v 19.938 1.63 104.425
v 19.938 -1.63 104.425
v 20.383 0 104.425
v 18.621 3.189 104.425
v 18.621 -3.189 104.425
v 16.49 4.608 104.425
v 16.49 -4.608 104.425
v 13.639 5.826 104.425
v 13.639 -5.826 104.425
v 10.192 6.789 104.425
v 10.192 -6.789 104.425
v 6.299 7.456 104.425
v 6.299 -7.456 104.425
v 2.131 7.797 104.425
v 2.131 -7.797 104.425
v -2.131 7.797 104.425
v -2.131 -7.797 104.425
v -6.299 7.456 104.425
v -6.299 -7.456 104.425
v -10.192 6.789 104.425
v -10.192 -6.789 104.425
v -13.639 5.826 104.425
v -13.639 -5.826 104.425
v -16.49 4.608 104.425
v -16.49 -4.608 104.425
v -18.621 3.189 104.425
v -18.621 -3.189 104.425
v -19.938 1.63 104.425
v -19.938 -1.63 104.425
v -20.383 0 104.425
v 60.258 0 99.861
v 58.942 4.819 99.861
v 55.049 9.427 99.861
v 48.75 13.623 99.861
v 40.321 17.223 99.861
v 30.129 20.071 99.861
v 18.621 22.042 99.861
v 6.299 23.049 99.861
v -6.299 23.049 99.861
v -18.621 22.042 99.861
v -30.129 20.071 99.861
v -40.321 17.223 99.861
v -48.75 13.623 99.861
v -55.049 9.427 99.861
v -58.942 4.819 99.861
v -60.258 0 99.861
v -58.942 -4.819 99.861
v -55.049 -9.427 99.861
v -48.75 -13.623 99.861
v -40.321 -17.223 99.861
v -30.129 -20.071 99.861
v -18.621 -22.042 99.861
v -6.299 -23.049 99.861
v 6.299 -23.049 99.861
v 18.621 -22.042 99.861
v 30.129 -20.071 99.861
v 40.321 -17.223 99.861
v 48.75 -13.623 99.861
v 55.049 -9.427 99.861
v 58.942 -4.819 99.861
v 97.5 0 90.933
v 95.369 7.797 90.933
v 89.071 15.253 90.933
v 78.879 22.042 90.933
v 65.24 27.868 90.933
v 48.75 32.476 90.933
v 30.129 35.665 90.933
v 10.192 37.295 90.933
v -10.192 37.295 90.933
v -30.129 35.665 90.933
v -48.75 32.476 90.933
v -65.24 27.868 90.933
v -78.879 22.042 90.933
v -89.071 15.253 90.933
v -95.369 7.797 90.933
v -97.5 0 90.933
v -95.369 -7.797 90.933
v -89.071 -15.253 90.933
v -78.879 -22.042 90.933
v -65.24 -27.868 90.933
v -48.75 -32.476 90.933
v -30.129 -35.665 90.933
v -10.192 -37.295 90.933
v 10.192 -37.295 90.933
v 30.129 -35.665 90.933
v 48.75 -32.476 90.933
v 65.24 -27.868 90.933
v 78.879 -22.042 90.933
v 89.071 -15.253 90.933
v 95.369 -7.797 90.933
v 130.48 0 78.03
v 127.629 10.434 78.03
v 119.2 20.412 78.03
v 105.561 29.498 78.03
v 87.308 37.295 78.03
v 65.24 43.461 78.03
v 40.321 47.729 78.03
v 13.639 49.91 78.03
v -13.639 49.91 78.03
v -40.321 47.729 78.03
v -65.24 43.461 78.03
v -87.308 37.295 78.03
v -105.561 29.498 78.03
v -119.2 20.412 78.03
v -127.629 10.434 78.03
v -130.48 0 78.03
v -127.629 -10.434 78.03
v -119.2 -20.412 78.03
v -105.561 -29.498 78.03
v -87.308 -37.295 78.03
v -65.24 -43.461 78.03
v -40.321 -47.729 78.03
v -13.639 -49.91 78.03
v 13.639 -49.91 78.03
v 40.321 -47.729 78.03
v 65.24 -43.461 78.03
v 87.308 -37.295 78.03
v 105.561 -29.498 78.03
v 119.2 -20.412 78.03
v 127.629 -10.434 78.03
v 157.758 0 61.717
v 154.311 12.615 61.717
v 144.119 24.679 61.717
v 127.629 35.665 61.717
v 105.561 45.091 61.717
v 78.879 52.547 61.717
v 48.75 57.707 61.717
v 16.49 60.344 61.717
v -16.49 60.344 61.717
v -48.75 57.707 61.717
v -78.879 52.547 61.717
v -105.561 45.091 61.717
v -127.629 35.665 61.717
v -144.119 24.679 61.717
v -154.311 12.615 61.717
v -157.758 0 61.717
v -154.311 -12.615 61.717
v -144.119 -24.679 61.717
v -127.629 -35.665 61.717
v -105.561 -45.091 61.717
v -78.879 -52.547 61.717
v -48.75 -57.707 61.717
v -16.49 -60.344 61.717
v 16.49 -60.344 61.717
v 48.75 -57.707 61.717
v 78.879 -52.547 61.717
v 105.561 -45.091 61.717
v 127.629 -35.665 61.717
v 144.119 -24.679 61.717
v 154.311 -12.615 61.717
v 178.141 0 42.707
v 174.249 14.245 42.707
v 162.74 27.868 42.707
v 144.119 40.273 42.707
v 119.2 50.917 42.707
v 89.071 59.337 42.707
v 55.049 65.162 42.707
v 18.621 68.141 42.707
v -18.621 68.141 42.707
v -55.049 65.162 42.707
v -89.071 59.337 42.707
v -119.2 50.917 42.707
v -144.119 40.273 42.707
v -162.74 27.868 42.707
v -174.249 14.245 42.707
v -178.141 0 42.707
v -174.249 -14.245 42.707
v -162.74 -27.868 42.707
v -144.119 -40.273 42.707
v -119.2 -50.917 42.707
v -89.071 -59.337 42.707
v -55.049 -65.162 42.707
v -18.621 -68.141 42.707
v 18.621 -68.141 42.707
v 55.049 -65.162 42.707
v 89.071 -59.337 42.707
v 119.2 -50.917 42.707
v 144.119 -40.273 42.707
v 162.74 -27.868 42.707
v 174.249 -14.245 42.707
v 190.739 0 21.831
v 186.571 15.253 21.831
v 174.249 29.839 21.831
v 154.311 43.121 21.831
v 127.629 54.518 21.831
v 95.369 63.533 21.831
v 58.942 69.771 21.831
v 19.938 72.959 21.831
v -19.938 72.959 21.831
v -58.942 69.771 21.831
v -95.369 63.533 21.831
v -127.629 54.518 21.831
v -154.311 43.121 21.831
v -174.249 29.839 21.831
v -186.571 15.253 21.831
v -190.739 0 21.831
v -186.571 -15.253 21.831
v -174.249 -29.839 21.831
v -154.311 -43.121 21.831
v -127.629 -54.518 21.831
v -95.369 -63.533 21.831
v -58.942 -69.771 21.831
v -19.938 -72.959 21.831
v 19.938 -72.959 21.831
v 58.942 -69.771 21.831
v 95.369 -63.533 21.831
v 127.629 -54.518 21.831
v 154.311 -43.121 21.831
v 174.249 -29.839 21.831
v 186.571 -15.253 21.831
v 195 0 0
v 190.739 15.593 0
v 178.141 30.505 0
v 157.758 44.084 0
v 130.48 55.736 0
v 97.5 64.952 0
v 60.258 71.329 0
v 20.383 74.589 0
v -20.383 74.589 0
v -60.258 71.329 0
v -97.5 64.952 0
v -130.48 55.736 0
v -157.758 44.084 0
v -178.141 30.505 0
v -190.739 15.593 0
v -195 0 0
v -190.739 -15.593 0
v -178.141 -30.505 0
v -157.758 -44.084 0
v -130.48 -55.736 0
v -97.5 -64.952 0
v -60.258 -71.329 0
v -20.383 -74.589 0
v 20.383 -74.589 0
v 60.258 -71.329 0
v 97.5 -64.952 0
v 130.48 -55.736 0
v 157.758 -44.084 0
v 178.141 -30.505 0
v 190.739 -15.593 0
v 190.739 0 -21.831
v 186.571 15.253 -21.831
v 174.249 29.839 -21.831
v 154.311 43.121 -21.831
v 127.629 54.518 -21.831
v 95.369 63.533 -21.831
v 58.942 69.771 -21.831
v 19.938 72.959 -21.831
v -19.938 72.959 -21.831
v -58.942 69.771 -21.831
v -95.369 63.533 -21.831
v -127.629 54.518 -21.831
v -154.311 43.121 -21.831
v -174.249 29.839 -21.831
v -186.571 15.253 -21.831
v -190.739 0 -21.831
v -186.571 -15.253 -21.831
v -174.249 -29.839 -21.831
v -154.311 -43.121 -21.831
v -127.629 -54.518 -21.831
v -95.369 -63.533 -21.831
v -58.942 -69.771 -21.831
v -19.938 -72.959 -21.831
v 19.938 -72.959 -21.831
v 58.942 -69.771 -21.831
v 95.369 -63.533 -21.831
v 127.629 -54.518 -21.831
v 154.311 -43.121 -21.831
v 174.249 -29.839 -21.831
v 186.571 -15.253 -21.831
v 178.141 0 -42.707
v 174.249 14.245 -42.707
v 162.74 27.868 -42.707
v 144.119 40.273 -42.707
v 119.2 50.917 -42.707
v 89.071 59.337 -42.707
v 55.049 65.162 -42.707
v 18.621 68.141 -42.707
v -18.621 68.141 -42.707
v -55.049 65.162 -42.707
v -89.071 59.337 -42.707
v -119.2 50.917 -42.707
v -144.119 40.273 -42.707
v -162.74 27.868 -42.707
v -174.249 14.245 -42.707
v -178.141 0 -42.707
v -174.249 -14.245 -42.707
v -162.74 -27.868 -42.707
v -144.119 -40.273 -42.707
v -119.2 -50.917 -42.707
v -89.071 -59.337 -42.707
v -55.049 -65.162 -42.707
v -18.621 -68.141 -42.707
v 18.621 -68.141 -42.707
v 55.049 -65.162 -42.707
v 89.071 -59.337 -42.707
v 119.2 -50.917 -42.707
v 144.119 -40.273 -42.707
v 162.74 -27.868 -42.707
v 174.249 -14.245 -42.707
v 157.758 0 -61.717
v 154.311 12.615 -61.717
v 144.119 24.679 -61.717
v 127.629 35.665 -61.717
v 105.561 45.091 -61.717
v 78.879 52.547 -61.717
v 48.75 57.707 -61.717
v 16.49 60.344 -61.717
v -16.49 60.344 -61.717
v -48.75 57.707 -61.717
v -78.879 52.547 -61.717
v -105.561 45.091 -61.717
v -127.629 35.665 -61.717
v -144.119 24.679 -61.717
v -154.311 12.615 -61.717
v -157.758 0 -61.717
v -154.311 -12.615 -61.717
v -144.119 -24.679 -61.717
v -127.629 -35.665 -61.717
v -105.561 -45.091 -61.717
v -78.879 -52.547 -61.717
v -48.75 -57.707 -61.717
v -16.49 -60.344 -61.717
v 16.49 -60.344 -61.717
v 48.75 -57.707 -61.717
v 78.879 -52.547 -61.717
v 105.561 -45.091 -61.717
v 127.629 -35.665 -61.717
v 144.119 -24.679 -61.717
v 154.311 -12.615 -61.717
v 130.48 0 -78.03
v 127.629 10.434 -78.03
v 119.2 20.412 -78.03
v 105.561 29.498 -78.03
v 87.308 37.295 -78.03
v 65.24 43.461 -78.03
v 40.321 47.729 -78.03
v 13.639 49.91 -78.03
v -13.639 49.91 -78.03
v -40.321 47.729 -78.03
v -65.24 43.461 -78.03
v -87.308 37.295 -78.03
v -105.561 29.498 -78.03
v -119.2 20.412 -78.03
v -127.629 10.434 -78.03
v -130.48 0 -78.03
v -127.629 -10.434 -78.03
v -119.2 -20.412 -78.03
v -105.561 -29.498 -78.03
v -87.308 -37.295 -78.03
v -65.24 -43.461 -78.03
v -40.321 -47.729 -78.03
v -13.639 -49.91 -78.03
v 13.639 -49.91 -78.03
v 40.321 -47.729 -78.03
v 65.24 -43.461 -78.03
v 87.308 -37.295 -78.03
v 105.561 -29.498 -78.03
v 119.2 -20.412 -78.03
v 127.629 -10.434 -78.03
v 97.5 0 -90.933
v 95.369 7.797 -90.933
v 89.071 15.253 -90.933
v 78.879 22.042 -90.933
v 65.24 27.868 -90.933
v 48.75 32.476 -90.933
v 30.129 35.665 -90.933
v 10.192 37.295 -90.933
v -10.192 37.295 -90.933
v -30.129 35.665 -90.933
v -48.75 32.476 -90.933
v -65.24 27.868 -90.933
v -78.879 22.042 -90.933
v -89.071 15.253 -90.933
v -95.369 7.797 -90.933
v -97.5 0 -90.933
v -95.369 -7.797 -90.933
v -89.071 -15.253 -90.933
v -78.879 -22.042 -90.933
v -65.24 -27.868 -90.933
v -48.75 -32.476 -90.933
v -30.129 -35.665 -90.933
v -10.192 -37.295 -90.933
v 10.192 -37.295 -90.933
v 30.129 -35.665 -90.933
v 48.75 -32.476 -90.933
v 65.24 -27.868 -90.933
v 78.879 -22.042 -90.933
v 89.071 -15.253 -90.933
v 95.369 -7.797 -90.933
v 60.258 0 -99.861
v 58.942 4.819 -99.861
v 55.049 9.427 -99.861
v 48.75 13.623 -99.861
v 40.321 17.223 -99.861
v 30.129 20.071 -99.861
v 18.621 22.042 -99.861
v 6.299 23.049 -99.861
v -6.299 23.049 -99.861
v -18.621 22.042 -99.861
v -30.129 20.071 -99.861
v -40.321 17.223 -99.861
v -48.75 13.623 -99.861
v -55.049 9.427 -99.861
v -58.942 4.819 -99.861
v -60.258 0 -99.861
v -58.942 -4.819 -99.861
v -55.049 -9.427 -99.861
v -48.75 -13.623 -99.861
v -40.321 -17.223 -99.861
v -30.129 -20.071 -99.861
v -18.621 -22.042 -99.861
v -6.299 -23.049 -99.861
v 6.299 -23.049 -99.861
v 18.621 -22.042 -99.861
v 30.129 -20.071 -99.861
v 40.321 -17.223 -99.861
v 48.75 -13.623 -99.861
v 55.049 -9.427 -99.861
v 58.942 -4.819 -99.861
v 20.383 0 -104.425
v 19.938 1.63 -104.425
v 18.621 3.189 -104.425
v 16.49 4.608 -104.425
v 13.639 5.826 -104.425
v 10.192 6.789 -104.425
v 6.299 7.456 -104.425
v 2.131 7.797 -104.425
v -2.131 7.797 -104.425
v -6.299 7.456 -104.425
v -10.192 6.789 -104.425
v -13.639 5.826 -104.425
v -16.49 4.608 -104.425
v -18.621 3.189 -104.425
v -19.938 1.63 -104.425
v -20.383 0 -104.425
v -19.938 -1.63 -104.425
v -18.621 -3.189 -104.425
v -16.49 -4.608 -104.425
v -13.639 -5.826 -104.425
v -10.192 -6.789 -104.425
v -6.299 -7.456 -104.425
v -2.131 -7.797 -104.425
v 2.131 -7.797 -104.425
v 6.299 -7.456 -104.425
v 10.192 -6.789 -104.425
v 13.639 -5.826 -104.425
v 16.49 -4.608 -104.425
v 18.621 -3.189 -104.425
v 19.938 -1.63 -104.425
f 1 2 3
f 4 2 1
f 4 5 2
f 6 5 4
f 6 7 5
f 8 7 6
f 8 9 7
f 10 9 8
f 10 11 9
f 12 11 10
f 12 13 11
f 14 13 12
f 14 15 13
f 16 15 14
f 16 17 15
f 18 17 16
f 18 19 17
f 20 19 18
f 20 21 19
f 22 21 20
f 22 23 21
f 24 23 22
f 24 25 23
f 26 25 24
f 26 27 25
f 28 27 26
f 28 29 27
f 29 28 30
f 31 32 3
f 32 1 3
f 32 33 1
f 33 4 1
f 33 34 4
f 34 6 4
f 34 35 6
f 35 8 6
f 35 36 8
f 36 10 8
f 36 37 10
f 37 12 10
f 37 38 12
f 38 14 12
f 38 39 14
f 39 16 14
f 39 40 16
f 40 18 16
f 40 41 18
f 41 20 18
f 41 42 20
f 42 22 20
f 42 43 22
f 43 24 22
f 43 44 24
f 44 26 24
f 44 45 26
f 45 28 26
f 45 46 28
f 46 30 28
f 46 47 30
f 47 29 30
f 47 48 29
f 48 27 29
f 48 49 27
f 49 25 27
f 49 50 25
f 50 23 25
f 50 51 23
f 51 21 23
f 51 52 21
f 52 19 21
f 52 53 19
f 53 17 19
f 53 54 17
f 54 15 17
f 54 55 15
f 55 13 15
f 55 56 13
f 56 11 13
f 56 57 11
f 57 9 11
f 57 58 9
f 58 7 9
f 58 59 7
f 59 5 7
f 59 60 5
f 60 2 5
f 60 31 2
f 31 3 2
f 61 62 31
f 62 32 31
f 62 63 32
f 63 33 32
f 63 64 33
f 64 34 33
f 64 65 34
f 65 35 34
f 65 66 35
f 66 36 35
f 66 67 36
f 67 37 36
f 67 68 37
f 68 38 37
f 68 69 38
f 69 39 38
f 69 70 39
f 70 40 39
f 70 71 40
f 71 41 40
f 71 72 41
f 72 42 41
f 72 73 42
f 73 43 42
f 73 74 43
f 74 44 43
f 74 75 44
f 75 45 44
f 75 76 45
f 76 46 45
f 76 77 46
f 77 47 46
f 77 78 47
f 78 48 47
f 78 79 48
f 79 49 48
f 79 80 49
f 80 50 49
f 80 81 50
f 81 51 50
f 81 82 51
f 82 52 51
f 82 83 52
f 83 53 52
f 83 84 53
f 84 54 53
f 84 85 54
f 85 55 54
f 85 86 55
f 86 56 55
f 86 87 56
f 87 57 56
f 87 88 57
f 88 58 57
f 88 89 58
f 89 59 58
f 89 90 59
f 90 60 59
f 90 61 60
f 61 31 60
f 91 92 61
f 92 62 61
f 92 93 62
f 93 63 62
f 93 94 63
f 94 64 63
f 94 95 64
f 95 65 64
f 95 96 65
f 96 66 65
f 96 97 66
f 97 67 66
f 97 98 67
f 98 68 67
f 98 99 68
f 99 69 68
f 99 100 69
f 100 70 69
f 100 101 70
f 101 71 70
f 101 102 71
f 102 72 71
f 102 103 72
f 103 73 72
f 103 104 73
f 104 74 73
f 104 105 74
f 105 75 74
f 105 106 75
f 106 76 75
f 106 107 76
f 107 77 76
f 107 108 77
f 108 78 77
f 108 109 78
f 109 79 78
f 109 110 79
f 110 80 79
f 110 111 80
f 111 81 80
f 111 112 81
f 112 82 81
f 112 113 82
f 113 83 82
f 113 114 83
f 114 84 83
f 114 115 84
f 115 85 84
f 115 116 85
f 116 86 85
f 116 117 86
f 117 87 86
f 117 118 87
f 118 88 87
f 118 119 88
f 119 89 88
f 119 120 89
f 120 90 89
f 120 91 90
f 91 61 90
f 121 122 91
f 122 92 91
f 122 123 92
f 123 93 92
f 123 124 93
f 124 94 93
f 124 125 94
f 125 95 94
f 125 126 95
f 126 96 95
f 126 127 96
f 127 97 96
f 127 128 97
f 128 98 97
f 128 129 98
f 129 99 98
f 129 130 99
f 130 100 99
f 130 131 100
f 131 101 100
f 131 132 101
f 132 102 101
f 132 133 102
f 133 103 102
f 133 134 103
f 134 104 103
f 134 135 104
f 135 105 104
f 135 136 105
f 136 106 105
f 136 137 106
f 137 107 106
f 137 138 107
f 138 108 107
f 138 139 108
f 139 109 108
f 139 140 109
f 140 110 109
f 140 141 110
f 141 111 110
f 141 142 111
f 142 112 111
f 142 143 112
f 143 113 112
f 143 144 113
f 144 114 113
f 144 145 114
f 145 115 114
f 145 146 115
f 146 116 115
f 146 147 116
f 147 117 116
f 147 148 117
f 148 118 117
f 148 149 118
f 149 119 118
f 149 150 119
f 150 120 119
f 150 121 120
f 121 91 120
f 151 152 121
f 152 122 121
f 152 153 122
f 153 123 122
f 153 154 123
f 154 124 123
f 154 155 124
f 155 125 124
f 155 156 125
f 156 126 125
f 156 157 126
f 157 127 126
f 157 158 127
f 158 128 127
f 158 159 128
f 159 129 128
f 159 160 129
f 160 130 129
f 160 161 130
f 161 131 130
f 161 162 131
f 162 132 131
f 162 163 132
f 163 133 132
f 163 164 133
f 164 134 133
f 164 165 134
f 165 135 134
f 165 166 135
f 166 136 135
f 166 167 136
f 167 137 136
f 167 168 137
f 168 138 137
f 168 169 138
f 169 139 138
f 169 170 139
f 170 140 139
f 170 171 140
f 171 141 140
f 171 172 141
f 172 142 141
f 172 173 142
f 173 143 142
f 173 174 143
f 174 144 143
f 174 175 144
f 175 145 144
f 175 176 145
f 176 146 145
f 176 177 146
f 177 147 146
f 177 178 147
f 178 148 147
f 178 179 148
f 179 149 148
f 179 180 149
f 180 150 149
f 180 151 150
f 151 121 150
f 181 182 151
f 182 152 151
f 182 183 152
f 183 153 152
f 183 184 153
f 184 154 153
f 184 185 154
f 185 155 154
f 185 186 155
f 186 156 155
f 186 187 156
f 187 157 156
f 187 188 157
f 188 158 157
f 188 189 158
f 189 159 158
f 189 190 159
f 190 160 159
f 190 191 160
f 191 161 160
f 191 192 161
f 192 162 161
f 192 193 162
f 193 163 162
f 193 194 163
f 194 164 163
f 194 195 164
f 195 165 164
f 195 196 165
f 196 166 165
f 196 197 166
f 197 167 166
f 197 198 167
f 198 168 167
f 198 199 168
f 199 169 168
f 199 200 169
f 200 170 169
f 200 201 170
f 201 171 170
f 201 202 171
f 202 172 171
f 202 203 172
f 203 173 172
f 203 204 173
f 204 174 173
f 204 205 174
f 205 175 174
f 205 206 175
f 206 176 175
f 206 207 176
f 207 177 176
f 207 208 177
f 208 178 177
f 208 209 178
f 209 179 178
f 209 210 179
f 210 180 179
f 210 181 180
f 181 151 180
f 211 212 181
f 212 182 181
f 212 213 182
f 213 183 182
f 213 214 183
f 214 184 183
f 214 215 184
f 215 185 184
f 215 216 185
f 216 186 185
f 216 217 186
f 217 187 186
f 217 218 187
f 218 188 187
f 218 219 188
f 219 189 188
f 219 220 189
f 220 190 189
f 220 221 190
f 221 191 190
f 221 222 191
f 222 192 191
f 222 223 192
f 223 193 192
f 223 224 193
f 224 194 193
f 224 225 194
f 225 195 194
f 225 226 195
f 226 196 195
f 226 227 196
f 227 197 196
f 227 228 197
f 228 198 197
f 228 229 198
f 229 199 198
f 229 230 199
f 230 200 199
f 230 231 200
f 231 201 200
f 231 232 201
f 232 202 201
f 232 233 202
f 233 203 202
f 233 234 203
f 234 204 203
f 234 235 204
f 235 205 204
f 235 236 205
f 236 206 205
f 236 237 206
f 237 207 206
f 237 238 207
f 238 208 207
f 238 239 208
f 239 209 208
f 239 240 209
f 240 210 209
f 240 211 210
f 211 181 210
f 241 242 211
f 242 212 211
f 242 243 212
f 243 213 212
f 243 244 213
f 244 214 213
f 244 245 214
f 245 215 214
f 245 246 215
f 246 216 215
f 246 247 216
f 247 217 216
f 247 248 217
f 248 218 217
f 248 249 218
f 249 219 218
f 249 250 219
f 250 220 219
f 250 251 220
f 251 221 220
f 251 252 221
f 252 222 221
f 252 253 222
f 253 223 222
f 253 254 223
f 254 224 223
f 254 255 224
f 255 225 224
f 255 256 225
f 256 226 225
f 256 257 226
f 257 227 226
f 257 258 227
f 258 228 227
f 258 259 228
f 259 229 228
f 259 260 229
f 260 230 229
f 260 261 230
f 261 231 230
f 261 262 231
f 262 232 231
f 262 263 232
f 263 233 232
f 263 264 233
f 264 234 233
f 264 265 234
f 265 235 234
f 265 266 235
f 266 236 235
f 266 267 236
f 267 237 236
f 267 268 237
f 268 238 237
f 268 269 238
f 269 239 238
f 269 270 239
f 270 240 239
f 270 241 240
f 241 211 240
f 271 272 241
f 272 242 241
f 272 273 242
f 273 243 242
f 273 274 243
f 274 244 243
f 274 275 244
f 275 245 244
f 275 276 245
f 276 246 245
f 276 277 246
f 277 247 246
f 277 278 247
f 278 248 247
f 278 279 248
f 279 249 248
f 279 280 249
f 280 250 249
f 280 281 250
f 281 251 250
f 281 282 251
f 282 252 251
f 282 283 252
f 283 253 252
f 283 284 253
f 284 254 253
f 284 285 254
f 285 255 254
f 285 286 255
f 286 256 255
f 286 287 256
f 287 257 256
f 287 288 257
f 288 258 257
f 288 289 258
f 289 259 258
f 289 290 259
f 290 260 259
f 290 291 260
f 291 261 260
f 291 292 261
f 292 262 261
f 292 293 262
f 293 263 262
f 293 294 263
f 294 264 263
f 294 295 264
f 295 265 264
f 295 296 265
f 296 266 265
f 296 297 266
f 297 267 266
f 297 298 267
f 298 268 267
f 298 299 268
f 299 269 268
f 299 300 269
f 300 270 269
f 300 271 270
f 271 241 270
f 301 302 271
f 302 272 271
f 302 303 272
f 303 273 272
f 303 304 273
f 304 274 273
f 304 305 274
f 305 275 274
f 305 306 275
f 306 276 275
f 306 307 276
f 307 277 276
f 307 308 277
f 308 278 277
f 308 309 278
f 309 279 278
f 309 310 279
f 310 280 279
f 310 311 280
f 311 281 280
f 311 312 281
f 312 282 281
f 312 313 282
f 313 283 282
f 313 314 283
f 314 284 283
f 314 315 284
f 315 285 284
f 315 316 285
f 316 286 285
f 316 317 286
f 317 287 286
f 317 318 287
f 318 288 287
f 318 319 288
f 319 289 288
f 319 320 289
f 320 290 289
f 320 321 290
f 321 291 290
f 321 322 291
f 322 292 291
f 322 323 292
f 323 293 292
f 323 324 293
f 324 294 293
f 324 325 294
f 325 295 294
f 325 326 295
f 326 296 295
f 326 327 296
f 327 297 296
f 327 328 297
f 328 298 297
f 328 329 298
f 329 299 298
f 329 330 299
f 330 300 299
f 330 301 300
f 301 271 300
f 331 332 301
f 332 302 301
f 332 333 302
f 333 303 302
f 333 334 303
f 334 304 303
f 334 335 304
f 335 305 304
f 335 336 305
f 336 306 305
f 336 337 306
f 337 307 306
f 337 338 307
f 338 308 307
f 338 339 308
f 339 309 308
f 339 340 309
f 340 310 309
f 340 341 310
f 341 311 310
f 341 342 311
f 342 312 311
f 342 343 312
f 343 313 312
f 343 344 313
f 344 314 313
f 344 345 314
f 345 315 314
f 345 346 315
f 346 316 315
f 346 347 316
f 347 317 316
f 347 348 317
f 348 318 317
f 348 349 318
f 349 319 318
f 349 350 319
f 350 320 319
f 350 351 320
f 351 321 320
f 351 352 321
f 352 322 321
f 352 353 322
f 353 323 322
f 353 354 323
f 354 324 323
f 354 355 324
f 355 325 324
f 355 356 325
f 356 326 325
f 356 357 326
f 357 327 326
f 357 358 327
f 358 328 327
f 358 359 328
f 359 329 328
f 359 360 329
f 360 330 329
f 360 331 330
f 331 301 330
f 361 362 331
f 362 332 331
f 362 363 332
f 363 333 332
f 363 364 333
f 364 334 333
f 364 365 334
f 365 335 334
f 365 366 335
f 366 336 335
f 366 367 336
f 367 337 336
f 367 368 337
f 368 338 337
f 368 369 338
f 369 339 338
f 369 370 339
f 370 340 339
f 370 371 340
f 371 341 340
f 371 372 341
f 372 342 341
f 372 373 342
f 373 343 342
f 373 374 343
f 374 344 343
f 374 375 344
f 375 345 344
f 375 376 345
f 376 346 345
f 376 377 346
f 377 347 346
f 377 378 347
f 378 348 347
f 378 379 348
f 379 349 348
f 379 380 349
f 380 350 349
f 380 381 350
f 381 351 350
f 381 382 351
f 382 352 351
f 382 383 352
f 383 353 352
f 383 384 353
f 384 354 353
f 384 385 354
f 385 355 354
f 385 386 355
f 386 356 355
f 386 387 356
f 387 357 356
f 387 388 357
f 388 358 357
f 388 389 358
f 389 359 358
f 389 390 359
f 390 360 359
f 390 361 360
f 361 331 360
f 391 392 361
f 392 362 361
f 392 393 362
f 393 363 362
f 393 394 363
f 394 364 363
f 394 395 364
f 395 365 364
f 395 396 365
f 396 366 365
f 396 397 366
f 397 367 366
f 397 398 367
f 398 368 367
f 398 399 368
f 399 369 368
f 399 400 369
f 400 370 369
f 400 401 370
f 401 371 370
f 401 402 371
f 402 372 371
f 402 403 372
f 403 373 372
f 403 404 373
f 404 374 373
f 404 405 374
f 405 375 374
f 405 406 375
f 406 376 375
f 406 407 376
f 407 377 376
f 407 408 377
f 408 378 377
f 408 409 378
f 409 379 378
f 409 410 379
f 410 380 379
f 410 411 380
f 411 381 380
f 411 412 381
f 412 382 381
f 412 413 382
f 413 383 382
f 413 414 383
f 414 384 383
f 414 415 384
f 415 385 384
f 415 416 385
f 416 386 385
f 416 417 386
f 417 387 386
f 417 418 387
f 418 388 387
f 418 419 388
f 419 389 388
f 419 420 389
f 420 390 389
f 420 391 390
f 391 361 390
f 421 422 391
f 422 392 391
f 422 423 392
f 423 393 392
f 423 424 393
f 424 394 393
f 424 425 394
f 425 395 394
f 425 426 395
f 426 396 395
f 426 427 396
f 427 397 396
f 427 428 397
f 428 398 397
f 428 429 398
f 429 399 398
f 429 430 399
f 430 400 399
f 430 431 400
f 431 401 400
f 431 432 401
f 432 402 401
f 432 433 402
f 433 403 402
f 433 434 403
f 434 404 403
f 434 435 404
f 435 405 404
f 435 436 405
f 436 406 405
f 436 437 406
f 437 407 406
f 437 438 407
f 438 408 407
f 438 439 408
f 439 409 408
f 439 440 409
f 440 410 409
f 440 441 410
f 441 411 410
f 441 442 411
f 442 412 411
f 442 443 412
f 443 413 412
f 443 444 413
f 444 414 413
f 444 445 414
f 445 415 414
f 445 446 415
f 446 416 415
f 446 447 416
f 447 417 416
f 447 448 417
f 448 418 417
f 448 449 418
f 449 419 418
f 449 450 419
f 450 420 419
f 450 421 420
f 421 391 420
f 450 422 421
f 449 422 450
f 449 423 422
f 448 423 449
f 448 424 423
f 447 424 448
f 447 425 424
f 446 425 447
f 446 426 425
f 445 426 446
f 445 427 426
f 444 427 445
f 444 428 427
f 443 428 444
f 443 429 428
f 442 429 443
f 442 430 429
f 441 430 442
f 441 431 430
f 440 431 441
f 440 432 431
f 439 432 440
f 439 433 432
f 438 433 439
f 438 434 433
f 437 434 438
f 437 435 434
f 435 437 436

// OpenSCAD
// Generated by SolidPython 1.0.1 on 2020-07-29 00:46:50


scale(v = [13, 5, 7]) {
	sphere(r = 15);
}
/***********************************************
*********      SolidPython code:      **********
************************************************
 
# import packages: SolidPython
from solid import *
from solid.utils import *
from itertools import chain, combinations, permutations


class Resize:

    def __init__(self, scad_file):
        self.scad_file = scad_file
        #self.scad_file = import_scad(scad_file)
        # cone/cylinder param:
        self.r1 = 0
        self.r2 = 0
        self.h = 0
        # rectangular prism param:
        self.w = 0
        self.l = 0
        # ellipse param:
        self.r = 0

    # import OpenScad code (file name corresponds to shape)


    # classify shape + parameters
    def assign(self, param1, param2, param3):
        if self.scad_file == 'cone.scad':
            self.r1 = param1
            self.r2 = param2
            self.h = param3
        elif self.scad_file == 'cylinder.scad':
            self.r1 = param1
            self.r2 = param2
            self.h = param3
        elif self.scad_file == 'rectangularPrism.scad':
            self.h = param1
            self.l = param2
            self.w = param3
        else:
            self.r = param1
            self.h = param2

    # resize parameters
    def iterate(self):
        x = range(3, 20, 2)
        i = 1
        if self.scad_file == 'cone.scad':
            tempList = list(permutations(x, 2))
            for temp in tempList:
                param1 = temp[0]
                param2 = temp[1]
                filepath = 'produced_scad_files/' + 'cone' + str(param1) + '_' + str(param2) + '_' + '.scad'
                scad_render_to_file(cylinder(h=param1, r1=param2, r2=0), filepath)

        elif self.scad_file == 'cylinder.scad':
            tempList = list(permutations(x, 3))
            for temp in tempList:
                param1 = temp[0]
                param2 = temp[1]
                filepath = 'produced_scad_files/' + 'cylinder' + str(param1) + '_' + str(param2) + '_' + '.scad'
                scad_render_to_file(cylinder(h=param1, r1=param2, r2=param2), filepath)

        elif self.scad_file == 'rectangularPrism.scad':
            tempList = list(permutations(x, 3))
            for temp in tempList:
                param1 = temp[0]
                param2 = temp[1]
                param3 = temp[2]
                filepath = 'produced_scad_files/' + 'rectangularPrism' + str(param1) + '_' + str(param2) + '_' + str(
                    param3) + '.scad'
                scad_render_to_file(cube(size=(param1, param2, param3)), filepath)

        elif self.scad_file == 'ellipse.scad':
            tempList = list(permutations(x, 4))
            for temp in tempList:
                param1 = temp[0]
                param2 = temp[1]
                param3 = temp[2]
                param4 = temp[3]
                filepath = 'produced_scad_files/' + 'ellipse' + str(param1) + '_' + str(param2) + '_' + str(param3) + '_' + str(param4) + '.scad'
                scad_render_to_file(scale([param1, param2, param3])(sphere(r=param4)), filepath)

    def render_to_scadfile(self):
        scad_render_to_file(scad, 'example.scad') 
 
************************************************/
